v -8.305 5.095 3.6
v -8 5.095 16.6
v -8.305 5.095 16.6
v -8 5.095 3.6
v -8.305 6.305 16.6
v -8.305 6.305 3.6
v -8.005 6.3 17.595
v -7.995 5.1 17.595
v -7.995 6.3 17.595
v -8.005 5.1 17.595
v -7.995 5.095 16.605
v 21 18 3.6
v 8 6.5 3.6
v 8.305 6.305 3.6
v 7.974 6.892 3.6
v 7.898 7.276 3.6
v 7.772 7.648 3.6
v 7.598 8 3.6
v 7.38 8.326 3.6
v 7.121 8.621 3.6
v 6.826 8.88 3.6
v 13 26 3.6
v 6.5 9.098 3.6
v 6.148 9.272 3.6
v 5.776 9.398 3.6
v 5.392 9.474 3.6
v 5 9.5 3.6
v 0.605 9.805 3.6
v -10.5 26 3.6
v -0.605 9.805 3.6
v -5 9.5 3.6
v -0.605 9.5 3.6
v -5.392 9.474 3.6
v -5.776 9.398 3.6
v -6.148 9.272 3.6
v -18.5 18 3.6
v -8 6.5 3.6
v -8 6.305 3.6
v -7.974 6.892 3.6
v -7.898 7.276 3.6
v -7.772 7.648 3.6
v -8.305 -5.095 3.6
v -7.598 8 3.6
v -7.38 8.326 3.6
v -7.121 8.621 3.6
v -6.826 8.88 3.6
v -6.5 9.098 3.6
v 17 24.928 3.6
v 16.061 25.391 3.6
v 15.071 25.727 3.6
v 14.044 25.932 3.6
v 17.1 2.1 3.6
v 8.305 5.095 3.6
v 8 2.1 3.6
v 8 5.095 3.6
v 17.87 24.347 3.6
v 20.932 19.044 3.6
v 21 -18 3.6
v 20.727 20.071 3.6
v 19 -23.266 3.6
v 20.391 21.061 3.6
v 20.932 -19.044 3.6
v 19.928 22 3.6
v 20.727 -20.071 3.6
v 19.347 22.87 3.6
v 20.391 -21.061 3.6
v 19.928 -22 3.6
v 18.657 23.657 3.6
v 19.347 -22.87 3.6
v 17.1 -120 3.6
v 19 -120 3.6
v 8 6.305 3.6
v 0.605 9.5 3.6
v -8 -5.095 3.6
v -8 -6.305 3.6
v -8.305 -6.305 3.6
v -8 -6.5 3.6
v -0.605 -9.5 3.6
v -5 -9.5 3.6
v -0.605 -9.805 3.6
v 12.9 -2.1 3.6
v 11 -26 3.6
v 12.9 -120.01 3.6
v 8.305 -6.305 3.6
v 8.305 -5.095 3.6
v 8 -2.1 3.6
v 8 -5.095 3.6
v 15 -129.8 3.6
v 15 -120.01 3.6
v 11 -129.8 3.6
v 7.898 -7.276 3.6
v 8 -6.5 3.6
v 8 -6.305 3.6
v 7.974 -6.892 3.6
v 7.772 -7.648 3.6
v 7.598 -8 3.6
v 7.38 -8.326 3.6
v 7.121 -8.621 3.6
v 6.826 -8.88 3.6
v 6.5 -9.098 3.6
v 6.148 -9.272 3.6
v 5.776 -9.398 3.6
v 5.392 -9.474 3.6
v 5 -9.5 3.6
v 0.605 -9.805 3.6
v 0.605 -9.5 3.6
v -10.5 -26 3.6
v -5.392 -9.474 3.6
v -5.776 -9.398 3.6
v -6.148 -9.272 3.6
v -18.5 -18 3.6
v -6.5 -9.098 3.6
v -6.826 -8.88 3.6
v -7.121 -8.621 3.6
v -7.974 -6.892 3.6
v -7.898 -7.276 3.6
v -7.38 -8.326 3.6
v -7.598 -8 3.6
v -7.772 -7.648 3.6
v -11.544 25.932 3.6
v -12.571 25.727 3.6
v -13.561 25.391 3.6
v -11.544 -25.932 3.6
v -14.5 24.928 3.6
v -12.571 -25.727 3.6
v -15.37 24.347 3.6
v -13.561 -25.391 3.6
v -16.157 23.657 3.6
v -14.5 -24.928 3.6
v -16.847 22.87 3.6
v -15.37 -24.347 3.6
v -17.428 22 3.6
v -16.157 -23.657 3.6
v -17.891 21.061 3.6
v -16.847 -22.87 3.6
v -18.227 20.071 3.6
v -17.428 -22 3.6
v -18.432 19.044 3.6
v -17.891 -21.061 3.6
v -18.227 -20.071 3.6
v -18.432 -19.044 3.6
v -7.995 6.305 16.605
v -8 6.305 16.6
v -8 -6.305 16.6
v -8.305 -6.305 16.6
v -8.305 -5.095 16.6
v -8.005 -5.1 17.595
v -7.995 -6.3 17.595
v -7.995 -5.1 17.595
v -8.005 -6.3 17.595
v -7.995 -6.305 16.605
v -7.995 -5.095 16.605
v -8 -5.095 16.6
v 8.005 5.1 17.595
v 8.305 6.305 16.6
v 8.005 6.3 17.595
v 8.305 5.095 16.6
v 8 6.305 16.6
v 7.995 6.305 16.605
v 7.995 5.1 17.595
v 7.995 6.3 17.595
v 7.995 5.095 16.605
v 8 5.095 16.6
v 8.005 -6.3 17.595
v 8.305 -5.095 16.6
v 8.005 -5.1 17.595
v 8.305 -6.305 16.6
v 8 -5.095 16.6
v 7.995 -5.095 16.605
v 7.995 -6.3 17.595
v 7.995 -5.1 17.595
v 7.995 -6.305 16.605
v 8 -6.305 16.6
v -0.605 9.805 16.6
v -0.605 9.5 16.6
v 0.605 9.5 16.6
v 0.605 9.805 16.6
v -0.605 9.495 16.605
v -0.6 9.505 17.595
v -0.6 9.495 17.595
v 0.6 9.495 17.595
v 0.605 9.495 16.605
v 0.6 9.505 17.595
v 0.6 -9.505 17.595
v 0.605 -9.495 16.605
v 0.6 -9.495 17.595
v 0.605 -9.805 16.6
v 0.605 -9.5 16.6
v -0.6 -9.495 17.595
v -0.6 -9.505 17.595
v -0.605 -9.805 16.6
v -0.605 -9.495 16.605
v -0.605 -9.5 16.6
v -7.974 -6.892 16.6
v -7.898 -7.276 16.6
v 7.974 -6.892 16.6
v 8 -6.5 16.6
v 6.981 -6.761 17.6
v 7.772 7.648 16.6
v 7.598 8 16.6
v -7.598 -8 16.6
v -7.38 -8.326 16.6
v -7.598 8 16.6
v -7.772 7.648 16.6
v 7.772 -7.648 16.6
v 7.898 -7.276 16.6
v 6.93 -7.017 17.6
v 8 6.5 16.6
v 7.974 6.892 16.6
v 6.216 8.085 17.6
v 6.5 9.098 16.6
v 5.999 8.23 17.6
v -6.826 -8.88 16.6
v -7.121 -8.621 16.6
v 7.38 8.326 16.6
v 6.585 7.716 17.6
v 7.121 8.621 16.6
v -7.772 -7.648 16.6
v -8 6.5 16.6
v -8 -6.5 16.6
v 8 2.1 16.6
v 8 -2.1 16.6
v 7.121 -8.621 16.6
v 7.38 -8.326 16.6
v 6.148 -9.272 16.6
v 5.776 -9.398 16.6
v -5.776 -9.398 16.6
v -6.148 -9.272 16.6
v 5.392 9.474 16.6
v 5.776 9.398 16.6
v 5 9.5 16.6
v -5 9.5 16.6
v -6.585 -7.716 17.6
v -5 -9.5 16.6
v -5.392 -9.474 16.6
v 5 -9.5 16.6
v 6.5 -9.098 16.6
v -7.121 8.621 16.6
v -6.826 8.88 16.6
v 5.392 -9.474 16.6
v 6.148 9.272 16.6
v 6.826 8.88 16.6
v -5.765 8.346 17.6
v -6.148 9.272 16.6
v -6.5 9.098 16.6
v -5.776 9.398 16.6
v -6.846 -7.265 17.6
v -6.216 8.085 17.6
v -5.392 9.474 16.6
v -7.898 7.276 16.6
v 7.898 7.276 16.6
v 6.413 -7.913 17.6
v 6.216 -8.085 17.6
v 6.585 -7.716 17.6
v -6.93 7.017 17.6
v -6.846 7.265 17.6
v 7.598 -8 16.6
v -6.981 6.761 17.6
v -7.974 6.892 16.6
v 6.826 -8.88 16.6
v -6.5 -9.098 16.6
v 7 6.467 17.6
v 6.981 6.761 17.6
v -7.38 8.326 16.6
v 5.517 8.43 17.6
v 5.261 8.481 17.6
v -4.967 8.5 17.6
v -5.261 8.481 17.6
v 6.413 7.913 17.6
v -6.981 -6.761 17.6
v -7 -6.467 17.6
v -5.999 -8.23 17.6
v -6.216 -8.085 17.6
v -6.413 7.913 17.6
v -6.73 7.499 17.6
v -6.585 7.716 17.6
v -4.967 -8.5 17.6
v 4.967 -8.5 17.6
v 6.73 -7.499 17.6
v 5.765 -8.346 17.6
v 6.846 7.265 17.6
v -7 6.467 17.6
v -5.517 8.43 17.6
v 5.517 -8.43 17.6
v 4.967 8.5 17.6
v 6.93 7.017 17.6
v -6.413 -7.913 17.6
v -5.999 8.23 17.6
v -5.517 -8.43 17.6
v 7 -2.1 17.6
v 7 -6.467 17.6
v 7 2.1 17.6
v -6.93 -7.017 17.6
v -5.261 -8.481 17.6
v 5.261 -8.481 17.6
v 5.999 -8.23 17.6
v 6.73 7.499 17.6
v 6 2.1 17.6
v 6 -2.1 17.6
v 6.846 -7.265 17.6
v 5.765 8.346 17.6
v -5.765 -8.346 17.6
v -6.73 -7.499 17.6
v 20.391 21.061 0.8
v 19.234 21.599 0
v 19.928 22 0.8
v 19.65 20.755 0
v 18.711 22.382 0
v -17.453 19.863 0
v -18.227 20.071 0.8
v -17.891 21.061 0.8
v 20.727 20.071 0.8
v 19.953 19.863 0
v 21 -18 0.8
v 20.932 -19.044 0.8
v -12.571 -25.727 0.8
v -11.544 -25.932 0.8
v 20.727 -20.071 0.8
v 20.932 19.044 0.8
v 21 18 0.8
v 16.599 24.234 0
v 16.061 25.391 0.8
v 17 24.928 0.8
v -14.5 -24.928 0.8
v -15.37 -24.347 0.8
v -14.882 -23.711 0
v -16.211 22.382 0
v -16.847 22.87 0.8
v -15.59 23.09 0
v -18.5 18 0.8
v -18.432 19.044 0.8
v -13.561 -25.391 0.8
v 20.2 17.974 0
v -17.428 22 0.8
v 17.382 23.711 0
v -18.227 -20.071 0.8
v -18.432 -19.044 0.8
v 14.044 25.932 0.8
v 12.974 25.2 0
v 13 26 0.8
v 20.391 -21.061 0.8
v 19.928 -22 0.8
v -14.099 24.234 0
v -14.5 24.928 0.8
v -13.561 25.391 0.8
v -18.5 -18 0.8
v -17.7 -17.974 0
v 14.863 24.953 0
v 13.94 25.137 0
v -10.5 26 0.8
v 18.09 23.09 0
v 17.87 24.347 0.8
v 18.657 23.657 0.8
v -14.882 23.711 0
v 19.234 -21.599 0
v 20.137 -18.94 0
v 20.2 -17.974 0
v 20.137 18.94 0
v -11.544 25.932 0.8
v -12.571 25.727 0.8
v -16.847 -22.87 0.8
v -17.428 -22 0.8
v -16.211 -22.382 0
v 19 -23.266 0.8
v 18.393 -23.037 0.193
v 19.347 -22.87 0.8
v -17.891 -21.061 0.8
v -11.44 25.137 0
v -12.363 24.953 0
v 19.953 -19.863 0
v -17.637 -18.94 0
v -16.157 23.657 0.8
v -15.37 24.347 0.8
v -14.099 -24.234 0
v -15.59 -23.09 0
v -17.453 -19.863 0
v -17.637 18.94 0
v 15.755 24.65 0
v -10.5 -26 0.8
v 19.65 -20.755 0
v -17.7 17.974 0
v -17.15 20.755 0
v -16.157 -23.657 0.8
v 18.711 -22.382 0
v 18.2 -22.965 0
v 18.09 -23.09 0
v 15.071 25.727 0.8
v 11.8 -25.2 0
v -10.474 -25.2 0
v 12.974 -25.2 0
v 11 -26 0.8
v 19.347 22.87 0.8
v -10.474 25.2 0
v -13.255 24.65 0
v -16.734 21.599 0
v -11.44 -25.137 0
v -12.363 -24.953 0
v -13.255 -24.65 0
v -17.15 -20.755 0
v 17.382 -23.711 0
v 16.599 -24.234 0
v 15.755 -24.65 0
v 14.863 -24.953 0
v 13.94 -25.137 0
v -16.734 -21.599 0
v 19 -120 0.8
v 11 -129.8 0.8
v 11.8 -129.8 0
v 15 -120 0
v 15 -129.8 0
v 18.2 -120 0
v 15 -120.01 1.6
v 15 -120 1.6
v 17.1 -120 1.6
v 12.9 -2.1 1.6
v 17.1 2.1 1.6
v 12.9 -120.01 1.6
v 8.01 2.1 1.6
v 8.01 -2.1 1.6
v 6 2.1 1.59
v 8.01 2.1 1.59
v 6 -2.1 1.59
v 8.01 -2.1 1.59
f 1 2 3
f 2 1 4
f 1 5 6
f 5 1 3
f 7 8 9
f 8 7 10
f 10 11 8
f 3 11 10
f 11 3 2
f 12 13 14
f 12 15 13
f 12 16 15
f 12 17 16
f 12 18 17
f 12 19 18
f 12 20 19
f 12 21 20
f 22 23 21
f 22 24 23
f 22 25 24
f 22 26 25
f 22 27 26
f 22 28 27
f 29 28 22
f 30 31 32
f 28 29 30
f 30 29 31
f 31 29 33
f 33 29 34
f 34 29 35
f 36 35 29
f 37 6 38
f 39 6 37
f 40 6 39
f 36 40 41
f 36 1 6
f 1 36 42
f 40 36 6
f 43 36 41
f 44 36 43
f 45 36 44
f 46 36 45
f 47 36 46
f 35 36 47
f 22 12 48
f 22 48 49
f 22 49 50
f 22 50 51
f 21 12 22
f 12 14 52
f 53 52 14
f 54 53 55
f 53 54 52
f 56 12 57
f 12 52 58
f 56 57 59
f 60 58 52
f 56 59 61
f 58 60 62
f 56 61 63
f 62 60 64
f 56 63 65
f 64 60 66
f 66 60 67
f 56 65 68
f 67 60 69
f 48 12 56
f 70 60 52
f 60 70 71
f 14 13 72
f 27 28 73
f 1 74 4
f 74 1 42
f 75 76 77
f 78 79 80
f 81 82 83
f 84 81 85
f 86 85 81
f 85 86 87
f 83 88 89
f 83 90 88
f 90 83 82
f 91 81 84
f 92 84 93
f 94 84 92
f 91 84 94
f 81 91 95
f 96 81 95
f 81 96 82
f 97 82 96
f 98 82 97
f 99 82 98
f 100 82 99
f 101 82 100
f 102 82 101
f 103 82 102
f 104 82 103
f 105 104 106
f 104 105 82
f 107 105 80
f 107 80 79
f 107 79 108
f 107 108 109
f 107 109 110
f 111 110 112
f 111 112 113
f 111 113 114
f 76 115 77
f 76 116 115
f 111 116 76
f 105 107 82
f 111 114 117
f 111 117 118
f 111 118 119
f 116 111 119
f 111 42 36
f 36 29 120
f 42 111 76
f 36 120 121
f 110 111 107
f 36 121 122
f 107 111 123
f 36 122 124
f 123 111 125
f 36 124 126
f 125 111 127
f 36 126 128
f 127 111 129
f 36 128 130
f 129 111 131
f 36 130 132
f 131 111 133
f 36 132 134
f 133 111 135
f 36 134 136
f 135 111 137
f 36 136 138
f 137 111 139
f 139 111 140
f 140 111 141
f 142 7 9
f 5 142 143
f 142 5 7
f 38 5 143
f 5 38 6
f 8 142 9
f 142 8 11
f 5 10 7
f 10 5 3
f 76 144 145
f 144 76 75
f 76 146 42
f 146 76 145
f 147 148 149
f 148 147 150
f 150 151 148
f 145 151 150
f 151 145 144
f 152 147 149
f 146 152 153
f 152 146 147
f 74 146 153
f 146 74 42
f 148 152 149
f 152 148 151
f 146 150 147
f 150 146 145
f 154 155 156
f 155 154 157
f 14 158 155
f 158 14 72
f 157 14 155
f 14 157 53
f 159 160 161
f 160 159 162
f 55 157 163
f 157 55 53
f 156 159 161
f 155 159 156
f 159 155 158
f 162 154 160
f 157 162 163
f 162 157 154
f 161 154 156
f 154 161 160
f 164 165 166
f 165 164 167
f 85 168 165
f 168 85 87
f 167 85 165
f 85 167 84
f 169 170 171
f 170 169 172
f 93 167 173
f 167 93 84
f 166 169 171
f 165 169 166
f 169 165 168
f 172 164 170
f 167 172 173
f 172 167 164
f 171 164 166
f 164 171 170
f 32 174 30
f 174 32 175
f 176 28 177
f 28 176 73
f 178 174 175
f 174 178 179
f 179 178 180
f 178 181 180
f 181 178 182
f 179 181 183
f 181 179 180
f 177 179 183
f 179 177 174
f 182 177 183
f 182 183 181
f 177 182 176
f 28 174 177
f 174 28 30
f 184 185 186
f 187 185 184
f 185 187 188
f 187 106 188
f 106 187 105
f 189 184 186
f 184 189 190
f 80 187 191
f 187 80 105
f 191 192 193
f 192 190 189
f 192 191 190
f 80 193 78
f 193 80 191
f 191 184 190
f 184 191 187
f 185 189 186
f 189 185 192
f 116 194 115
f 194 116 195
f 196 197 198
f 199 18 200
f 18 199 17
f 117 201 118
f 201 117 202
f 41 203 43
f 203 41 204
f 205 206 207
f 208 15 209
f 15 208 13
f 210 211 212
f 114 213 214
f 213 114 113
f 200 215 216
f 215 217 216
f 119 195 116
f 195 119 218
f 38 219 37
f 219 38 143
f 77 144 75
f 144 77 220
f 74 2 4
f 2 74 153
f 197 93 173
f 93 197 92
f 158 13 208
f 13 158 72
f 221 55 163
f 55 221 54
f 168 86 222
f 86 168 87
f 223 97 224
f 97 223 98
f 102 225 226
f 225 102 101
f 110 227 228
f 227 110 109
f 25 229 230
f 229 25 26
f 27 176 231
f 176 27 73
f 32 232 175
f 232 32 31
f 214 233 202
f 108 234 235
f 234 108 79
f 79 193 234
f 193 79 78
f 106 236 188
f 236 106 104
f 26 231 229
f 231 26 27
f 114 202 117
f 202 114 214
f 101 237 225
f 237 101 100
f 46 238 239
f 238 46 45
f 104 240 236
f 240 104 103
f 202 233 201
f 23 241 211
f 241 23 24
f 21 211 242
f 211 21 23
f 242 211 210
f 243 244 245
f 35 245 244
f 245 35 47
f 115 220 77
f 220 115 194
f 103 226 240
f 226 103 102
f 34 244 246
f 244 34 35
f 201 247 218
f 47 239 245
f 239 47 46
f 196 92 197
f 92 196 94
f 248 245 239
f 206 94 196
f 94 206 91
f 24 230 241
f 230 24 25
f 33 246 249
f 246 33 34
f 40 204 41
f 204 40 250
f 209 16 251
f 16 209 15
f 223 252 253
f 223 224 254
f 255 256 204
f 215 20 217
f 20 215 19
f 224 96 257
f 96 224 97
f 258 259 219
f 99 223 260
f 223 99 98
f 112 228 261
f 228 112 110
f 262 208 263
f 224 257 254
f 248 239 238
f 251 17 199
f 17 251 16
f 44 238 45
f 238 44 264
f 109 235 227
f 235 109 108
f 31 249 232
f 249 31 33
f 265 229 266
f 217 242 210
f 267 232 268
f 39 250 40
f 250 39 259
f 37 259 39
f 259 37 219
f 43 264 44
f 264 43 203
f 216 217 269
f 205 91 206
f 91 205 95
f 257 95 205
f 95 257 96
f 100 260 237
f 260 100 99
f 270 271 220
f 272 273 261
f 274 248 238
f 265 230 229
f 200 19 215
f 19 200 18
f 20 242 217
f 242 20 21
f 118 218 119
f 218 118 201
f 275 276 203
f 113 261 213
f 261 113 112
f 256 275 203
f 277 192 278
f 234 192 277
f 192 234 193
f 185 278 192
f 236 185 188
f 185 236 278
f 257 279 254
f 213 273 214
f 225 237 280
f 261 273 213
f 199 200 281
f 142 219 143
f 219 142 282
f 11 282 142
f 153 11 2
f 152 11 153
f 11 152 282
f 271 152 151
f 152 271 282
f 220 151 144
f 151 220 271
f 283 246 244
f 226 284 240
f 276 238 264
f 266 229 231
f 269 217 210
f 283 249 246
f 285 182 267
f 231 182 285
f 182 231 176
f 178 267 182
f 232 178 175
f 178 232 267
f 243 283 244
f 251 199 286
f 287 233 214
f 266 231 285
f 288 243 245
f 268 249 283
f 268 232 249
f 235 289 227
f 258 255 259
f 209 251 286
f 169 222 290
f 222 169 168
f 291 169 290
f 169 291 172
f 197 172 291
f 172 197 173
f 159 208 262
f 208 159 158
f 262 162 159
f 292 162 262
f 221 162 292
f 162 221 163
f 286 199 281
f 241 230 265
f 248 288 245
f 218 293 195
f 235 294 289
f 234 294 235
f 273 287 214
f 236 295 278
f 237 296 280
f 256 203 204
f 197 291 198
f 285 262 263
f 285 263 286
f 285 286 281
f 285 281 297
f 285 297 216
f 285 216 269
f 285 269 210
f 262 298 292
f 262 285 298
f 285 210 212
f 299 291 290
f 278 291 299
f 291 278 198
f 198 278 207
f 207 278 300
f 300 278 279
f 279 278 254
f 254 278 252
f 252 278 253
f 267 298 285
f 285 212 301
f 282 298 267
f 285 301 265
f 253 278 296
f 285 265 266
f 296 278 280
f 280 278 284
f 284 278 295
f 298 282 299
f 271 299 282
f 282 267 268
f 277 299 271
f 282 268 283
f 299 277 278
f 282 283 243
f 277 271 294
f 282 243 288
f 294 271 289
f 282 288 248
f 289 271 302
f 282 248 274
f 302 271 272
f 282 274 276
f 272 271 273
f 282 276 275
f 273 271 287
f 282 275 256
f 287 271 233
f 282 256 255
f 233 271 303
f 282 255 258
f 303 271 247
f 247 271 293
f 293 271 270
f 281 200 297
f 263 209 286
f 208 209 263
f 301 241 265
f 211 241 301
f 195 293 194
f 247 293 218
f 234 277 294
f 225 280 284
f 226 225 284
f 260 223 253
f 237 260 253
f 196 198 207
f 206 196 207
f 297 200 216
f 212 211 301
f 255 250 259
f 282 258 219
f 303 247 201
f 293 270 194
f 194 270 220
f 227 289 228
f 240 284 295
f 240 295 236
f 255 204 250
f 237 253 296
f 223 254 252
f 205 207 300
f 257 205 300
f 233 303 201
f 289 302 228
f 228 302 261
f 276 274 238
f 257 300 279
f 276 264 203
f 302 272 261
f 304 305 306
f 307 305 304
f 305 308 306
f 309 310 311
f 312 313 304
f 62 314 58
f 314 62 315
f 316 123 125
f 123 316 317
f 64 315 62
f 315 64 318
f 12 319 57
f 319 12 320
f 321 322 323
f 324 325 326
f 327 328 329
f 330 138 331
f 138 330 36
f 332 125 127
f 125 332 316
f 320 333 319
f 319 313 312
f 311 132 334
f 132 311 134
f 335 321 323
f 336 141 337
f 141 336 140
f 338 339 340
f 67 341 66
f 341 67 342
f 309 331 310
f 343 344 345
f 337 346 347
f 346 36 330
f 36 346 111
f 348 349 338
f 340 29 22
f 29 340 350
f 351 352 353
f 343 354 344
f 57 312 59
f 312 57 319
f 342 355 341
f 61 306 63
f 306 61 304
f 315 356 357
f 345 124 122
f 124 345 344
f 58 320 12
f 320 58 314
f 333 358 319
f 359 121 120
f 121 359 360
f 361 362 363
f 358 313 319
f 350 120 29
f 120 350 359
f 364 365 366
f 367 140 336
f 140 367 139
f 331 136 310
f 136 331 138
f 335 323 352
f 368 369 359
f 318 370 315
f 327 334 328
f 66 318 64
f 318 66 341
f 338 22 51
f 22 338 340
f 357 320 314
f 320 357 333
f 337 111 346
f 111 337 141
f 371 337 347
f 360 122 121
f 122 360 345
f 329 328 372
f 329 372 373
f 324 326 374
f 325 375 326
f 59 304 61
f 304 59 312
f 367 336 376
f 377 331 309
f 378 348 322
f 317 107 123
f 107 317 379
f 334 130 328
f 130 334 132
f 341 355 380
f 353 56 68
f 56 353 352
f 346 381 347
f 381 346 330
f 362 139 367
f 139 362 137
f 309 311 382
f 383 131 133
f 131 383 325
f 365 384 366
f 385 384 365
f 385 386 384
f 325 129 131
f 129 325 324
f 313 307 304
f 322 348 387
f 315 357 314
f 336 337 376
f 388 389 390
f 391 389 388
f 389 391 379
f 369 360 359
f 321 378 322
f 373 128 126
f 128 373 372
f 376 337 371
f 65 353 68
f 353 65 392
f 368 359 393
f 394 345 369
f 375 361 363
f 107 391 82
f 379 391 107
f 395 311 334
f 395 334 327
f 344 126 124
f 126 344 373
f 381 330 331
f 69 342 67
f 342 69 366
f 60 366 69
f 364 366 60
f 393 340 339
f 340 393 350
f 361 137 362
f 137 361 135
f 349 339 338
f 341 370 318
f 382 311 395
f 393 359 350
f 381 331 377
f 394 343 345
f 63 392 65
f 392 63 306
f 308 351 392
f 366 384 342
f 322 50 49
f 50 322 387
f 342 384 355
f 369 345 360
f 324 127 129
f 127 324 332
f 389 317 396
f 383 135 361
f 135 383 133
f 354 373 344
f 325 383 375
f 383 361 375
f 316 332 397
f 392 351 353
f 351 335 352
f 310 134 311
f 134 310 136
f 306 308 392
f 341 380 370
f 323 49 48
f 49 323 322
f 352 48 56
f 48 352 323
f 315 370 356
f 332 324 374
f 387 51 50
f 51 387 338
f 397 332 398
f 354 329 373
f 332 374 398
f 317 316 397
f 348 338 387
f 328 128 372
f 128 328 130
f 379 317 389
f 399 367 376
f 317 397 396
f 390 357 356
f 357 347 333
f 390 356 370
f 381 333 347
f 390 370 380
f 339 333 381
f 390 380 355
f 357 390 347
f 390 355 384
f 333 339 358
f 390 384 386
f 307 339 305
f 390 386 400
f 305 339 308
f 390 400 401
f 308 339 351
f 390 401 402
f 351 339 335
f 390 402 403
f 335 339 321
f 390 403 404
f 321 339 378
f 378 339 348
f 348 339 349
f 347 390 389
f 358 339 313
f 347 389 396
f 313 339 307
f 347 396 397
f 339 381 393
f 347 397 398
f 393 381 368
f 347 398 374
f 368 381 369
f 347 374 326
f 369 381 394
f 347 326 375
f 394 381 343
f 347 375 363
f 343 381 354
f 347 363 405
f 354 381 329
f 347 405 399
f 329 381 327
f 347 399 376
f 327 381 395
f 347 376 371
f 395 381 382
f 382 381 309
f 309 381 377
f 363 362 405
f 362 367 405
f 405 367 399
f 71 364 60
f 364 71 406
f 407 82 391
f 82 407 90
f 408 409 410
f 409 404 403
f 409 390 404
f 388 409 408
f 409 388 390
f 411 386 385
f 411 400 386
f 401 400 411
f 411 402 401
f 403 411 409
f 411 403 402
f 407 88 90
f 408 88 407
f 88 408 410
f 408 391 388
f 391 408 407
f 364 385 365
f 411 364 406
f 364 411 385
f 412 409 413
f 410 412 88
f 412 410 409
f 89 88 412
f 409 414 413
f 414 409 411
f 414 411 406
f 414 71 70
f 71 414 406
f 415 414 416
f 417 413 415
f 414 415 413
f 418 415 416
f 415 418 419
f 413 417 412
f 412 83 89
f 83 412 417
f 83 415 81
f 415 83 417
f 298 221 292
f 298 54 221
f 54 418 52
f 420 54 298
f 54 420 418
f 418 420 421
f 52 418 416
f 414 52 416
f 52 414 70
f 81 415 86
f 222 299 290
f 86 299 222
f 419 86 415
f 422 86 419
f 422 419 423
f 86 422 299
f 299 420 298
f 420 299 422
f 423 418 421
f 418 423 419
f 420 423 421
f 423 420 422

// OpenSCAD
// doorbell-wire-channel.scad
//
// A surface raceway for the Aqara doorbell's power wire, and the cap on the
// hole it disappears into. The wire is two conductors joined by their
// insulation, 1.7 thick x 3.8 wide (Ziad, 2026-09-13). From the doorbell it
// runs 260 mm down the wall, jogs 15 mm to the left, and goes into the old
// doorbell's wire hole. Grey PETG, to match the paint.
//
// THE HOLE AND THE OLD CAP. The hole is a rounded rectangle, about 16 x 19,
// and _incoming/doorbell-hole-cap.stl is what has been in it: a hollow plug
// of that section 8 mm deep under a 24 x 26 flange 0.8 thick with a rounded
// rim (measured off the mesh 2026-09-13). Ziad: the plug is the right size
// but does not go in far enough to stay put, and the flange does not reach
// the old doorbell's screw holes, which sit about 10 mm outside the hole
// above and below it. So the plug here is solid, plug_depth deep, with
// crush ribs a little proud of the hole's size, and the cap is cap_w x cap_h
// — tall enough to cover a screw hole at 19/2 + 10 from the centre with
// cap_margin to spare.
//
// ⚠️ ASSUMED: the hole's 19 mm dimension is the vertical one, in line with
// the screw holes. hole_w and hole_h swap if not. Also assumed: 14 mm of
// plug can go in before it hits anything; the old one went 8.
//
// THE RACEWAY IS A COVER. The wire runs against the wall, in a groove down
// the BACK of a rw_w x rw_h bar; the front is a plain chamfered face. Nothing
// holds the wire in but the wall — the bar is laid over the wire and taped
// down by the two rails either side of the groove. (Ziad, 2026-09-13: the
// first draft had the slot on the front, wire showing.) Every front edge is
// chamfered rw_ch at 45 — a chamfer rather than a round because the front
// face goes on the bed (below) and a round would start at 90 degrees.
//
// THE CAP IS AS THICK AS THE RACEWAY. The old cap was 0.8. Here the groove
// has to cross the cap to reach the plug, and cap and raceway have to share
// one front face if the piece is to print face down in one go — a 0.8 flange
// under a 3.6 raceway would print in the air. So cap_t = rw_h, and the
// groove runs across the cap's back to the plug's edge and straight into a
// groove down the plug's side; the wire goes into the hole beside the plug.
// The cap is also wide enough (cap_right > jog + rw_w/2) that the vertical
// run comes down onto the cap's top edge and the jog happens inside the
// plate, as a turn in the groove, rather than as a visible elbow beside it.
//
// TWO PIECES, because 260 does not fit a 220 bed. The lower piece is the
// cap, the jog, and lower_run of the vertical; the upper is the rest. They
// meet in a half-lap IN PLAN: the lower's left half carries on lap mm past
// its right half, and the upper's left half is cut back the same, so the
// seam steps across the width. Full height everywhere, so both pieces print
// face down with nothing in the air — a lap in the thickness would put one
// half of the joint 0.8 mm off the bed. The tape does the holding; the lap
// only keeps them in line. Set lower_run so the lower piece — lower_run +
// lap + cap_h/2 tall — and upper_run both stay under 205.
//
// PRINTED FACE DOWN. flip = true (the default) turns each piece over so the
// front face, chamfers and all, is on the bed and the groove, rails and plug
// are on top. flip = false draws it the way it goes on the wall: x to the
// right, y up, z out of the wall, the wall at z = 0, the hole's centre at
// the origin.
//
// COUPON. show = "cap" is the cap and plug alone, with the groove from its
// edge — print that first: if the plug will not go in, drop plug_rib; if it
// does not hold, raise it or plug_depth.

/* [Output] */
// lower — jog, cap, plug, and the lower part of the vertical run
// upper — the rest of the vertical run
// cap   — cap and plug alone, the fit coupon
// both  — lower and upper laid side by side, to look at
show = "lower";  // [lower, upper, cap, both]

// Printed orientation, front face on the bed. false draws it as it mounts.
flip = true;

/* [Wire — measured] */
wire_t = 1.7;    // wire, thick (mm)
wire_w = 3.8;    // wire, wide (mm)

/* [Hole — measured off the old cap] */
hole_w = 16.0;   // across (mm)
hole_h = 19.0;   // up and down, in line with the screw holes (mm)
hole_r = 3.0;    // the hole's corner radius, from the old plug (mm)
screw_off = 10.0;  // old screw holes, from the hole's edge, above and below (mm)

/* [Run] */
run_len   = 260.0;  // doorbell to the jog's centreline (mm)
jog       = 15.0;   // the run's centreline is this far right of the hole (mm)
lower_run = 120.0;  // of run_len, on the lower piece; the rest is the upper (mm)
lap       = 10.0;   // the lap joint (mm)
lap_clr   = 0.2;    // between tongue end and the upper's back plate (mm)

/* [Raceway] */
rw_w     = 8.0;   // across (mm)
rw_h     = 3.6;   // off the wall; also the cap's thickness (mm)
slot_w   = 4.2;   // the groove, for the wire's 3.8 (mm)
slot_d   = 2.0;   // the groove, for the wire's 1.7; what is left in front is the skin (mm)
rw_ch    = 0.8;   // chamfer on every front edge, 45 deg (mm)

/* [Cap] */
cap_right  = 21.0;  // hole centre to the cap's right edge; enough that the run lands on the cap, not beside it (mm)
cap_left   = 18.5;  // hole centre to the left edge; was 21, Ziad took 2.5 off looking at the front view (mm)
cap_margin = 6.5;   // past the far edge of a screw hole, above and below (mm)
cap_r      = 8.0;   // corner radius (mm)

/* [Plug] */
plug_depth = 14.0;  // into the hole; the old one went 8 (mm)
plug_rib   = 0.3;   // crush ribs proud of the hole's size, per side (mm)
rib_w      = 1.2;   // (mm)
plug_lead  = 1.0;   // chamfer on the plug's leading edge (mm)
groove_d   = 2.0;   // the wire groove down the plug's side, deep (mm)

/* [Quality] */
$fn = 48;

eps = 0.01;

// ---- derived ---------------------------------------------------------------

upper_run = run_len - lower_run;
cap_h     = hole_h + 2 * (screw_off + cap_margin);   // 52.0
cap_w     = cap_left + cap_right;                     // 39.5
cap_x     = (cap_right - cap_left) / 2;               // the cap's centre, right of the hole
cap_t     = rw_h;
plug_hw   = hole_w / 2;
plug_hh   = hole_h / 2;

assert(slot_d > wire_t && slot_w > wire_w, "the wire does not fit the groove");
assert(lower_run + lap + cap_h / 2 <= 205 && upper_run <= 205, "a piece is longer than the safe bed");

module rr(w, h, r) offset(r = r) offset(delta = -r) square([w, h], center = true);

// The raceway in section, x across and y out from the wall.
module rw_outer() polygon([
  [-rw_w / 2, 0], [rw_w / 2, 0], [rw_w / 2, rw_h - rw_ch], [rw_w / 2 - rw_ch, rw_h],
  [-rw_w / 2 + rw_ch, rw_h], [-rw_w / 2, rw_h - rw_ch]]);
// The groove, open to the wall.
module rw_slot() translate([-slot_w / 2, -eps]) square([slot_w, slot_d + eps]);

// A section, run from y = a to y = b, or from x = a to x = b.
module along_y(a, b) translate([0, b, 0]) rotate([90, 0, 0]) linear_extrude(b - a) children();
module along_x(a, b) rotate([0, 0, -90]) along_y(a, b) children();

// The cap plate, front edges chamfered, centred cap_x right of the hole.
module cap_plate() translate([cap_x, 0, 0]) hull() {
  linear_extrude(cap_t - rw_ch) rr(cap_w, cap_h, cap_r);
  translate([0, 0, cap_t - eps]) linear_extrude(eps) offset(delta = -rw_ch) rr(cap_w, cap_h, cap_r);
}

// The plug, hanging below z = 0: the hole's section, ribbed, with a lead-in.
module plug() {
  mirror([0, 0, 1]) {
    hull() {
      linear_extrude(plug_depth - plug_lead) rr(hole_w, hole_h, hole_r);
      translate([0, 0, plug_depth - eps]) linear_extrude(eps) offset(delta = -plug_lead) rr(hole_w, hole_h, hole_r);
    }
    // Ribs: two a side on the long faces, one a side on the short, each
    // fading to nothing over its last plug_lead so the plug still starts in.
    for (sx = [-1, 1], y = [-plug_hh * 0.6, plug_hh * 0.6])
      rib([sx * plug_hw, y], [sx * plug_rib, 0], [0, rib_w]);
    for (sy = [-1, 1])
      rib([0, sy * plug_hh], [0, sy * plug_rib], [rib_w, 0]);
  }
}
// A rib on a face at p, standing out by v, span s along the face; z down.
module rib(p, v, s) hull() {
  translate([p[0] + v[0] / 2, p[1] + v[1] / 2, (plug_depth - plug_lead) / 2])
    cube([max(abs(v[0]), s[0]) + eps, max(abs(v[1]), s[1]) + eps, plug_depth - plug_lead], center = true);
  translate([p[0], p[1], plug_depth - eps])
    cube([max(eps, s[0]), max(eps, s[1]), eps], center = true);
}

// The plug's wire groove, down its right side, open to the cap's groove.
module plug_groove()
  translate([plug_hw - groove_d, -slot_w / 2, -plug_depth - eps])
    cube([groove_d + eps, slot_w, plug_depth + slot_d + 2 * eps]);

module lower() difference() {
  union() {
    cap_plate();
    plug();
    translate([jog, 0, 0]) along_y(-rw_w / 2, lower_run + lap - lap_clr) rw_outer();
    along_x(0, jog + rw_w / 2) rw_outer();
  }
  // The right half stops at lower_run; the left carries on as the tongue.
  translate([jog, lower_run, -eps]) cube([rw_w / 2 + eps, lap + eps, rw_h + 2 * eps]);
  translate([jog, 0, 0]) along_y(-slot_w / 2, lower_run + eps) rw_slot();
  along_x(plug_hw - groove_d, jog + eps) rw_slot();
  plug_groove();
}

// From y = 0 at the joint to upper_run at the doorbell; the left half is
// cut back lap mm to take the lower's tongue.
module upper() difference() {
  along_y(0, upper_run) rw_outer();
  along_y(-eps, upper_run + eps) rw_slot();
  translate([-rw_w / 2 - eps, -eps, -eps]) cube([rw_w / 2 + eps, lap + eps, rw_h + 2 * eps]);
}

// The fit coupon: cap and plug, groove from the cap's right edge to the plug.
module cap_only() difference() {
  union() { cap_plate(); plug(); }
  along_x(plug_hw - groove_d, cap_right + eps) rw_slot();
  plug_groove();
}

module oriented() {
  if (flip) translate([0, 0, rw_h]) rotate([180, 0, 0]) children();
  else children();
}

if (show == "lower") oriented() lower();
if (show == "upper") oriented() upper();
if (show == "cap")   oriented() cap_only();
if (show == "both") {
  oriented() lower();
  translate([cap_w / 2 + rw_w + 10, -cap_h / 2, 0]) oriented() upper();
}

echo(str("cap ", cap_w, " x ", cap_h, " x ", cap_t, " (", cap_left, " left of the hole, ", cap_right, " right); plug ", hole_w, " x ", hole_h,
         " + ", plug_rib, " ribs, ", plug_depth, " deep; lower piece ",
         lower_run + lap + cap_h / 2, " tall, upper ", upper_run));
